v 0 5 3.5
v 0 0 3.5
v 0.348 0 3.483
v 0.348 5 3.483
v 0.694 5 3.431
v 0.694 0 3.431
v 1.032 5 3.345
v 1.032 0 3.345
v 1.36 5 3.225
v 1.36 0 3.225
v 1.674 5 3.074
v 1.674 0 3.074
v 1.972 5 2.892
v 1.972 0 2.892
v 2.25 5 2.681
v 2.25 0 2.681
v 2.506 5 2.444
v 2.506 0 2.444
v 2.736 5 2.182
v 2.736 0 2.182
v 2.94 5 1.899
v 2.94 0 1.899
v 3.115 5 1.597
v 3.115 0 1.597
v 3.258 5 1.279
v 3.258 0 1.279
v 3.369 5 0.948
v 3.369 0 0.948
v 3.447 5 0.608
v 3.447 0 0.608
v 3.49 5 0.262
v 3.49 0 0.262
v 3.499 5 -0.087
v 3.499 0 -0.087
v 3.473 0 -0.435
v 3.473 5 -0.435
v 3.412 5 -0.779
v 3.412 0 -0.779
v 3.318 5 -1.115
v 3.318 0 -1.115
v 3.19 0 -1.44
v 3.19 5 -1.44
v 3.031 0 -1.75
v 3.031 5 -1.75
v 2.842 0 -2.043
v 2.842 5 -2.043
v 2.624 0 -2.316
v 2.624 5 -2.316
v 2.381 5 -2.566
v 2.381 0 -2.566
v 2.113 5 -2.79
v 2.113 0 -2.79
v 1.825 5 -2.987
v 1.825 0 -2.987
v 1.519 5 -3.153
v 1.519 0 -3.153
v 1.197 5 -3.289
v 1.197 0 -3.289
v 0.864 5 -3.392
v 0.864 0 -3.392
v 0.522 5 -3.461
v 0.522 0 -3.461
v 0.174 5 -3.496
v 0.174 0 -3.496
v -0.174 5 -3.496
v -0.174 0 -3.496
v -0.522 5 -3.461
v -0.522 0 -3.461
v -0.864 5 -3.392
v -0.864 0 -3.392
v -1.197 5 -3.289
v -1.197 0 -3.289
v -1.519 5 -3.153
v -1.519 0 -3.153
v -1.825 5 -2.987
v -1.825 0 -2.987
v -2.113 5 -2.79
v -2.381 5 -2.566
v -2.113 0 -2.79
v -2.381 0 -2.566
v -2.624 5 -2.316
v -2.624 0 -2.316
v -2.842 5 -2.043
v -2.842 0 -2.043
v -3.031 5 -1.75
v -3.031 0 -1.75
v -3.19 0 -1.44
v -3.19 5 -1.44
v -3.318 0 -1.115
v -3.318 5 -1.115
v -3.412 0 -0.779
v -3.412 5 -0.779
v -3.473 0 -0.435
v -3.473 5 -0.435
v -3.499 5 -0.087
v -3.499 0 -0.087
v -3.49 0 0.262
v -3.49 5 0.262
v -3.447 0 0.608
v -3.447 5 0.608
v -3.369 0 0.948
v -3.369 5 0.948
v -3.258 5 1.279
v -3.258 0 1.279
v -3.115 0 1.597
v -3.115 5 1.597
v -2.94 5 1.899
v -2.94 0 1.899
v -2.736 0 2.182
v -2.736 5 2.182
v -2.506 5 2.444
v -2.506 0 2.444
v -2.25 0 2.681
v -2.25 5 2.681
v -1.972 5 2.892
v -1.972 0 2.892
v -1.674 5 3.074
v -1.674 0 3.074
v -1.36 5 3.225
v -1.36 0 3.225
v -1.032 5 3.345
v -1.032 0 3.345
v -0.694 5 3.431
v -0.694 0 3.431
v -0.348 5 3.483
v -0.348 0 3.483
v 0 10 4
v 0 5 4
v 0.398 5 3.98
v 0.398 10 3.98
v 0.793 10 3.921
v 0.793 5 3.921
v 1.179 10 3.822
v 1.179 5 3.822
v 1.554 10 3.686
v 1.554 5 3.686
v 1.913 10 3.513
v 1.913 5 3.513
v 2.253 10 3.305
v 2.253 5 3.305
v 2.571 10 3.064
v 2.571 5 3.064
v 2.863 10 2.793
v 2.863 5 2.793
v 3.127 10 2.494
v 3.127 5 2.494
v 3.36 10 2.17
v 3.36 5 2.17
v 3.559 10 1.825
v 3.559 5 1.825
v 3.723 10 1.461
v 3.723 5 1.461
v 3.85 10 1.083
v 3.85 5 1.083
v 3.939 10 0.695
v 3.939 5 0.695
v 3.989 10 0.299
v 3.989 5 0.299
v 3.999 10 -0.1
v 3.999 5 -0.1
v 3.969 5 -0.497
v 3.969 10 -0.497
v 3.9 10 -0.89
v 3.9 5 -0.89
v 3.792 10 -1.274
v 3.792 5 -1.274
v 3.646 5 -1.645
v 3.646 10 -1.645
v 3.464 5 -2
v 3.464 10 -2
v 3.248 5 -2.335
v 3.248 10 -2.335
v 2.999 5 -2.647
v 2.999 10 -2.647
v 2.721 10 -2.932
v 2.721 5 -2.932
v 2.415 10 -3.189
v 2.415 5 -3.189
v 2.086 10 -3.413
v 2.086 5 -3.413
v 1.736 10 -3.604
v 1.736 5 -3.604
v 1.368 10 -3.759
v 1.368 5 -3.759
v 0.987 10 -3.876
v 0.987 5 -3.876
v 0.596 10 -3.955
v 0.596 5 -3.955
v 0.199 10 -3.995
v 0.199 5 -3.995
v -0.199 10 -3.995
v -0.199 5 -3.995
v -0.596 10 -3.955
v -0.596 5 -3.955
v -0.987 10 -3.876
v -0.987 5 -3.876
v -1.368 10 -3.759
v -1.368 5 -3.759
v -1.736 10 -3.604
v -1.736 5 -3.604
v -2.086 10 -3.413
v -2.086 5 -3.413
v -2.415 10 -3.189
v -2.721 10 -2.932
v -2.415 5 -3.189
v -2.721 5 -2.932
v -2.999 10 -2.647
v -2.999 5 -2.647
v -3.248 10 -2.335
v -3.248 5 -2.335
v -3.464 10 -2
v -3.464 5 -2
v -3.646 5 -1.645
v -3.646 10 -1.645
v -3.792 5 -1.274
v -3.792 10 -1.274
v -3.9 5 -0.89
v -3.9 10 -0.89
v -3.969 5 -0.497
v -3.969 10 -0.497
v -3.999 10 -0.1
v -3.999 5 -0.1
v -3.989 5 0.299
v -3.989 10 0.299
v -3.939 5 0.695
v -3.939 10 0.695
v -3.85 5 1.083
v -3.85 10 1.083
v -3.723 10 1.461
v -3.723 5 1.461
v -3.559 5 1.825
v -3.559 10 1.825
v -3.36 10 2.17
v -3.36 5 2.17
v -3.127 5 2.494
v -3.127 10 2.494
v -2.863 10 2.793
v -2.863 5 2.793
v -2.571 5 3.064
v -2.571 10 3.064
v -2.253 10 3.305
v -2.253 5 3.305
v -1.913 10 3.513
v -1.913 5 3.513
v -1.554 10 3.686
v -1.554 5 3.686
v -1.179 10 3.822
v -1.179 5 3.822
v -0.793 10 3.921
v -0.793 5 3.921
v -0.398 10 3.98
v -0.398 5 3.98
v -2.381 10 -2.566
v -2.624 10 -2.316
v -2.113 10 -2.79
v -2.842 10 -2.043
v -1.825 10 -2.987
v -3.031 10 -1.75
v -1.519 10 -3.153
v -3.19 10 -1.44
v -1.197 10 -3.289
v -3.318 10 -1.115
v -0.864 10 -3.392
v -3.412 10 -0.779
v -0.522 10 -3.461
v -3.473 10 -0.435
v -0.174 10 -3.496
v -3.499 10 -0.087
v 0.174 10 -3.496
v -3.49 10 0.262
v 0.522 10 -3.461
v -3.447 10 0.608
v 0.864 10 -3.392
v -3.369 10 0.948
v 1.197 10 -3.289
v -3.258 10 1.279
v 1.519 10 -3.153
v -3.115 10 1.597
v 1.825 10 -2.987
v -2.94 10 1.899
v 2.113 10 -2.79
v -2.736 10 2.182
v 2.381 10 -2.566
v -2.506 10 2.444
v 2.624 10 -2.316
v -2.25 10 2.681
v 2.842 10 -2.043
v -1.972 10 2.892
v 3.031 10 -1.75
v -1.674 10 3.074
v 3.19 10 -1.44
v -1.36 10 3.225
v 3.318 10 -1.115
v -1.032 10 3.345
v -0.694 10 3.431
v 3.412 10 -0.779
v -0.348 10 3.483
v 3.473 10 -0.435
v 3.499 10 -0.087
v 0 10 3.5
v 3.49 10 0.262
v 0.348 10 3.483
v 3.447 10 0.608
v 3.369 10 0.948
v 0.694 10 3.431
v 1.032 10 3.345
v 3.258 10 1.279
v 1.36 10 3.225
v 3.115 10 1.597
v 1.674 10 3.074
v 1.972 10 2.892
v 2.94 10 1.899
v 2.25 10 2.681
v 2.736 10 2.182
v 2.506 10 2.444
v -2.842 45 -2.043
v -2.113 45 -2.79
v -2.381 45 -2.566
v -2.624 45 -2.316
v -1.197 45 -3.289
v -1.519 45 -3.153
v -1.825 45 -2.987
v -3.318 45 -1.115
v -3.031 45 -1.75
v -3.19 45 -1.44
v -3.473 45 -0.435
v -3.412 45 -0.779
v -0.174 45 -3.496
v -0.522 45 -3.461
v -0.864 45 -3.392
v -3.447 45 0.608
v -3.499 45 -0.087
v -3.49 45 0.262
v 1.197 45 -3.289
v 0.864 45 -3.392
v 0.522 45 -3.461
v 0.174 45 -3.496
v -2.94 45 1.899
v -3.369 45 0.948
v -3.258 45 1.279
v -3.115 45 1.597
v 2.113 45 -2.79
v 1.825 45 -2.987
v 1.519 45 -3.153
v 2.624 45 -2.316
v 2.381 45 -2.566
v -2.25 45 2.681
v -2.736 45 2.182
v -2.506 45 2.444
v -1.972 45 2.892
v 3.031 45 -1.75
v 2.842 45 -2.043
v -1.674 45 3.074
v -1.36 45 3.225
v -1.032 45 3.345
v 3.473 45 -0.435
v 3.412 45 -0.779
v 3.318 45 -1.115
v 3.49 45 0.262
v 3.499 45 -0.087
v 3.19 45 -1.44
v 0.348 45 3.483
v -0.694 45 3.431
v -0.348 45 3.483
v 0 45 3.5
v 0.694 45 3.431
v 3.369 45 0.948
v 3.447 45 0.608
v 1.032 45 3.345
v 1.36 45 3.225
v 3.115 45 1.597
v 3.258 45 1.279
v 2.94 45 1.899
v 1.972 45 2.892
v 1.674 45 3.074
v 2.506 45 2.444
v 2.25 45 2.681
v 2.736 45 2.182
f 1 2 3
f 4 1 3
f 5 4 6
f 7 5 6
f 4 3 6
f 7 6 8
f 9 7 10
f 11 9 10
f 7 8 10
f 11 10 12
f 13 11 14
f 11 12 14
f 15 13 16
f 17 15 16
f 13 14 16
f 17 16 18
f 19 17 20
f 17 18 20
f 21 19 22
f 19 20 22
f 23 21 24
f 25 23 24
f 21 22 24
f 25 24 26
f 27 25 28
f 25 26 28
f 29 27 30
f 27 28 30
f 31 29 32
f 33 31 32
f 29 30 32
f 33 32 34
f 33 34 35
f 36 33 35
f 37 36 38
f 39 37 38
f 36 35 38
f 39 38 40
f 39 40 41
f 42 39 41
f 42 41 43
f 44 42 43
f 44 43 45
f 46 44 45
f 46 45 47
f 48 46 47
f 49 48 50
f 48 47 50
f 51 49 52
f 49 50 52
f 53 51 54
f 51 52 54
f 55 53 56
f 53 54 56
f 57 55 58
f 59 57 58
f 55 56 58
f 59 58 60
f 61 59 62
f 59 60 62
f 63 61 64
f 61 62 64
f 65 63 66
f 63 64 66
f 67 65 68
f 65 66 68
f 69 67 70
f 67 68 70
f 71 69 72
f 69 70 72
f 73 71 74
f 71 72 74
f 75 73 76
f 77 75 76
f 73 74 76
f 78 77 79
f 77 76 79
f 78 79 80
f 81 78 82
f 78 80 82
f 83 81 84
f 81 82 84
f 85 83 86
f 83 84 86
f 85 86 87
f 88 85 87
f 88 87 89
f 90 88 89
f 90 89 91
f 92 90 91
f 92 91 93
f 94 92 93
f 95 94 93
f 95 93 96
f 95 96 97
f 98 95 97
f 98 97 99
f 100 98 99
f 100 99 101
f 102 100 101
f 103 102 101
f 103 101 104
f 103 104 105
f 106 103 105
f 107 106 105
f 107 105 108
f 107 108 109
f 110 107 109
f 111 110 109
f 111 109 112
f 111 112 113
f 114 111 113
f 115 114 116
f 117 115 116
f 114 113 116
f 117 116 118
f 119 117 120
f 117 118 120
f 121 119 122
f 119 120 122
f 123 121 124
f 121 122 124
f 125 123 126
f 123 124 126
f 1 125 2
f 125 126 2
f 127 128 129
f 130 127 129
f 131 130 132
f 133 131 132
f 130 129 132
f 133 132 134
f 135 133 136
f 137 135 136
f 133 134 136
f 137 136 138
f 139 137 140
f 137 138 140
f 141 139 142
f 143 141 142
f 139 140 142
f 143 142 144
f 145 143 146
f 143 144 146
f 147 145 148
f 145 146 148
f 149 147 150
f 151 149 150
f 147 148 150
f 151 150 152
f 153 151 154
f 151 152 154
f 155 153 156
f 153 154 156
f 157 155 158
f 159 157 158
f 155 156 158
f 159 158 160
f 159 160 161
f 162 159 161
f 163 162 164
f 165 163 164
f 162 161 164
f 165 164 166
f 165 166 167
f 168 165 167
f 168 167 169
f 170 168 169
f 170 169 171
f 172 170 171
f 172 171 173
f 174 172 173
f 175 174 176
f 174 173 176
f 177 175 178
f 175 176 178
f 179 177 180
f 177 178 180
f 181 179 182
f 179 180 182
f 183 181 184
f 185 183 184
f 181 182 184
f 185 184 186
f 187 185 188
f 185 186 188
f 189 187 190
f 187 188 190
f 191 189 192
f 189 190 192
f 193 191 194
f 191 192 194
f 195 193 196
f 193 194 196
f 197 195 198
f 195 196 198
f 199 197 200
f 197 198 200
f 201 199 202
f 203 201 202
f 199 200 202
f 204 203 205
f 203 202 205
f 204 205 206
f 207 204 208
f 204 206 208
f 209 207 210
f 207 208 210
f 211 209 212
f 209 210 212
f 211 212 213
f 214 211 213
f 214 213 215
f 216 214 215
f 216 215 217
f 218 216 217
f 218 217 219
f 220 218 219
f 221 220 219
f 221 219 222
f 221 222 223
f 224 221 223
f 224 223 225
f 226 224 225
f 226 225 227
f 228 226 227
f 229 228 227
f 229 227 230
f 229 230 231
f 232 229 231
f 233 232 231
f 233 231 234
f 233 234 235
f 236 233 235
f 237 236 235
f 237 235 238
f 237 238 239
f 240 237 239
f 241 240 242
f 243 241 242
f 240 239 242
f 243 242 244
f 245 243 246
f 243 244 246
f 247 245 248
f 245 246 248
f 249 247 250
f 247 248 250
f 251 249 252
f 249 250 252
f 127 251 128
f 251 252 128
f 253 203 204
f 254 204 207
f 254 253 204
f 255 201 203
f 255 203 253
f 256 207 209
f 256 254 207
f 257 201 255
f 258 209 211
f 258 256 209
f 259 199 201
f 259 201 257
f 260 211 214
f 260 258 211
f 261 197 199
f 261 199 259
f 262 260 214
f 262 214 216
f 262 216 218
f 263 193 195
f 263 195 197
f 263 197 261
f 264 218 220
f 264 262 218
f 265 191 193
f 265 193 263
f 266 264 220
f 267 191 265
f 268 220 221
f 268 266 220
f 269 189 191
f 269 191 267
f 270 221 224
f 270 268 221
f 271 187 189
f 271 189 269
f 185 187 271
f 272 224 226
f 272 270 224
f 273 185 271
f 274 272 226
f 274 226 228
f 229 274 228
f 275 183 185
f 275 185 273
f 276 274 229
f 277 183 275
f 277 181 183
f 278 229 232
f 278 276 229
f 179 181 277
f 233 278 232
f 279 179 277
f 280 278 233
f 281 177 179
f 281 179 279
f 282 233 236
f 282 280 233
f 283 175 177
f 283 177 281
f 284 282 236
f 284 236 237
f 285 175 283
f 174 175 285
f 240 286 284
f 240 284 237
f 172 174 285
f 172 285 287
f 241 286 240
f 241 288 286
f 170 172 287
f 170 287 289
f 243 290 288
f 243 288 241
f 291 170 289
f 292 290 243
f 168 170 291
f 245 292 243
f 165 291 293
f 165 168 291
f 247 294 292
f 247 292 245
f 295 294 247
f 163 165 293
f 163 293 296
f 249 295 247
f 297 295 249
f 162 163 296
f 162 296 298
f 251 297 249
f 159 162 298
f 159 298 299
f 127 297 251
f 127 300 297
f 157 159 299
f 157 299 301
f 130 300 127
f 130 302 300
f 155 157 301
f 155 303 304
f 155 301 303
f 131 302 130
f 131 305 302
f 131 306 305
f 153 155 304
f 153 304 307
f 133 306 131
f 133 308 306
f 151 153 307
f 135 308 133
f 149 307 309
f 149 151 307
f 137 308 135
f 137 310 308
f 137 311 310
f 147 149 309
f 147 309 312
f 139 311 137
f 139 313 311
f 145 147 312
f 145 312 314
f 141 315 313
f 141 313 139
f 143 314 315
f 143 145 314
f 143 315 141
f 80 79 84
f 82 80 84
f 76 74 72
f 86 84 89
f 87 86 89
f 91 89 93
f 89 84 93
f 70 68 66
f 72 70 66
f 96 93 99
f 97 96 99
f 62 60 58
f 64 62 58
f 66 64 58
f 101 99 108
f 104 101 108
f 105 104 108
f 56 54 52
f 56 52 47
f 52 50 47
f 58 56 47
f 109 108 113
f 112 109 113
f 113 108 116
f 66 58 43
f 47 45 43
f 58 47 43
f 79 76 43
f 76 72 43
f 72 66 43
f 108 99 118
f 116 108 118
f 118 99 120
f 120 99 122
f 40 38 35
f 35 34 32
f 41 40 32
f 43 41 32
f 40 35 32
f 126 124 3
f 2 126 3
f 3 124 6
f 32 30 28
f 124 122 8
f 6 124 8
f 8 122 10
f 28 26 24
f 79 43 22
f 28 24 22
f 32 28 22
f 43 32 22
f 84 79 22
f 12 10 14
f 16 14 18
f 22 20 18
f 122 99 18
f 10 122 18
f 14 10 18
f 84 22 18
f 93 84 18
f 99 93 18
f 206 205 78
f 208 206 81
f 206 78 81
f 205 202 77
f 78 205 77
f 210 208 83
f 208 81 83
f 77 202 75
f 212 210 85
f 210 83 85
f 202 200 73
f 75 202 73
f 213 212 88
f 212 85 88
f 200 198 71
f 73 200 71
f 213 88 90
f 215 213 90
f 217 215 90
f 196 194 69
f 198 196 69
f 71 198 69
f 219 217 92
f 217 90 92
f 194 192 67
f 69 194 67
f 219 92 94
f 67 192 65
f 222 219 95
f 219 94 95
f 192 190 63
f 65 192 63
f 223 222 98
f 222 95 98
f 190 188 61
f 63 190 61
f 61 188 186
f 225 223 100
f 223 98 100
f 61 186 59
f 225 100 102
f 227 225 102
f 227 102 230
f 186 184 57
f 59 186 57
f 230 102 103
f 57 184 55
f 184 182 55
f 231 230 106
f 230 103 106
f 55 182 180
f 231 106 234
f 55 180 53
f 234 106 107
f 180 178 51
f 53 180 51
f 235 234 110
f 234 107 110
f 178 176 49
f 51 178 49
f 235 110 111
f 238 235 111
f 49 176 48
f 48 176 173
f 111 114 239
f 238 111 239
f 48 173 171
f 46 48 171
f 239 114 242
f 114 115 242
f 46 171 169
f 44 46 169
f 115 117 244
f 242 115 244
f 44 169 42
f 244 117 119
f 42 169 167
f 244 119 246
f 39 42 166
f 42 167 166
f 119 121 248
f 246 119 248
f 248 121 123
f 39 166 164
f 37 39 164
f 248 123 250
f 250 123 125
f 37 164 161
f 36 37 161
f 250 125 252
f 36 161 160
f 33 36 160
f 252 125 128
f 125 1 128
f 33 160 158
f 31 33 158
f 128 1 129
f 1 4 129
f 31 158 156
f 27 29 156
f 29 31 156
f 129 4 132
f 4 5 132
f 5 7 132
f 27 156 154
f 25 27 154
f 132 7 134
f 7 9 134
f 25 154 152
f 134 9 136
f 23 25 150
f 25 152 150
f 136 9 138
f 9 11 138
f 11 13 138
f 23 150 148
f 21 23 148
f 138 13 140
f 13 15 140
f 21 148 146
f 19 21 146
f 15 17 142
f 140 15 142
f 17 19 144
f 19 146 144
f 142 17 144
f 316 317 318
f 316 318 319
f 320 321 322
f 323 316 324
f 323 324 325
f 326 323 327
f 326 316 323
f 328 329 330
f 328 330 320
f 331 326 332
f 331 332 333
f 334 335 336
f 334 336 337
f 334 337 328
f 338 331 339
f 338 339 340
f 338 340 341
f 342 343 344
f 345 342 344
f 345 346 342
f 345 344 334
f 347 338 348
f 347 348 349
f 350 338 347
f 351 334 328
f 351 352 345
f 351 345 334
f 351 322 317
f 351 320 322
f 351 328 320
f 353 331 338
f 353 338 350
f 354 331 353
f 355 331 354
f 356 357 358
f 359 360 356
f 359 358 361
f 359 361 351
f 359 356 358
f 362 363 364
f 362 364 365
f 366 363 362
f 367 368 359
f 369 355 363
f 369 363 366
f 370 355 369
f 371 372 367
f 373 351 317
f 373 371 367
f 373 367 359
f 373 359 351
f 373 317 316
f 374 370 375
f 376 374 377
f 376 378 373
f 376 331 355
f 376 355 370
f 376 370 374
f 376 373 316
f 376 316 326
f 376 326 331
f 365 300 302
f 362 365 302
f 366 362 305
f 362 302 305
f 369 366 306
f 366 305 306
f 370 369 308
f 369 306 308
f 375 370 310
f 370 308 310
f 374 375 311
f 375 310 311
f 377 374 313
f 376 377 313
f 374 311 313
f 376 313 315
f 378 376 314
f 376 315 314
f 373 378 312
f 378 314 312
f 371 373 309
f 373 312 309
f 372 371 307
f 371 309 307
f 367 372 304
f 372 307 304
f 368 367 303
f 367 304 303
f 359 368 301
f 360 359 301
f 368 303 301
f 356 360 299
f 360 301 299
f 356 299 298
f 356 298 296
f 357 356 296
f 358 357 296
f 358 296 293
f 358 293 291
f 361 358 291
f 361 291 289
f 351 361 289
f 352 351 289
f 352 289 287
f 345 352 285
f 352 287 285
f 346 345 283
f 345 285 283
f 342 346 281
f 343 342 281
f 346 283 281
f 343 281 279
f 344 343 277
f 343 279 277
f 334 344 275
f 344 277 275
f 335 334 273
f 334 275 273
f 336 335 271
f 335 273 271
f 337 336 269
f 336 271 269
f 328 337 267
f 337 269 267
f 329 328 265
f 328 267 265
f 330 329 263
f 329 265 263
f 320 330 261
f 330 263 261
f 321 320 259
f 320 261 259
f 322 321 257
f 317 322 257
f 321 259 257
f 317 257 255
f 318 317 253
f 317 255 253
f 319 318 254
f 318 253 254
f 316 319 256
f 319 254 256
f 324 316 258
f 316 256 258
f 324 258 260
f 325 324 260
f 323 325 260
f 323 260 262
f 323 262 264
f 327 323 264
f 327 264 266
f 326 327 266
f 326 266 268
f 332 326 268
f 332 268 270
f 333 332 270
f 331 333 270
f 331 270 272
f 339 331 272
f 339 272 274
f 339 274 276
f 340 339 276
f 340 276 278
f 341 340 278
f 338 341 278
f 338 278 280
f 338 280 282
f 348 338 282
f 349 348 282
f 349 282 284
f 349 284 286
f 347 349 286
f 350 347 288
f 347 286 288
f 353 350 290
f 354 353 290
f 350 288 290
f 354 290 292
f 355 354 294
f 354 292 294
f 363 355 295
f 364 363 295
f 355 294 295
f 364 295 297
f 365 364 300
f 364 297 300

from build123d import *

# Parameters (mm, degrees)
SKETCH1_R           = 3.5
BOSS_EXTRUDE1_DEPTH = 5
SKETCH2_R           = 4
BOSS_EXTRUDE2_DEPTH = 5
SKETCH3_R           = 3.5
BOSS_EXTRUDE3_DEPTH = 35


with BuildPart() as part:
    # Sketch1 → Boss-Extrude1 (new body)
    with BuildSketch(Plane(origin=(0, 0, 0), x_dir=(1, 0, 0), z_dir=(0, 1, 0))):
        with Locations(Location((0, 0, 0), (0, 0, 270))):  # turned: the seam where the file's is
            Circle(SKETCH1_R)
    extrude(amount=BOSS_EXTRUDE1_DEPTH)

    # Sketch2 → Boss-Extrude2 (add)
    with BuildSketch(Plane(origin=(0, 5, 0), x_dir=(1, 0, 0), z_dir=(0, 1, 0))):
        with Locations(Location((0, 0, 0), (0, 0, 270))):  # turned: the seam where the file's is
            Circle(SKETCH2_R)
    extrude(amount=BOSS_EXTRUDE2_DEPTH)

    # Sketch3 → Boss-Extrude3 (add)
    with BuildSketch(Plane(origin=(0, 10, 0), x_dir=(1, 0, 0), z_dir=(0, 1, 0))):
        with Locations(Location((0, 0, 0), (0, 0, 270))):  # turned: the seam where the file's is
            Circle(SKETCH3_R)
    extrude(amount=BOSS_EXTRUDE3_DEPTH)


solid = part.part
